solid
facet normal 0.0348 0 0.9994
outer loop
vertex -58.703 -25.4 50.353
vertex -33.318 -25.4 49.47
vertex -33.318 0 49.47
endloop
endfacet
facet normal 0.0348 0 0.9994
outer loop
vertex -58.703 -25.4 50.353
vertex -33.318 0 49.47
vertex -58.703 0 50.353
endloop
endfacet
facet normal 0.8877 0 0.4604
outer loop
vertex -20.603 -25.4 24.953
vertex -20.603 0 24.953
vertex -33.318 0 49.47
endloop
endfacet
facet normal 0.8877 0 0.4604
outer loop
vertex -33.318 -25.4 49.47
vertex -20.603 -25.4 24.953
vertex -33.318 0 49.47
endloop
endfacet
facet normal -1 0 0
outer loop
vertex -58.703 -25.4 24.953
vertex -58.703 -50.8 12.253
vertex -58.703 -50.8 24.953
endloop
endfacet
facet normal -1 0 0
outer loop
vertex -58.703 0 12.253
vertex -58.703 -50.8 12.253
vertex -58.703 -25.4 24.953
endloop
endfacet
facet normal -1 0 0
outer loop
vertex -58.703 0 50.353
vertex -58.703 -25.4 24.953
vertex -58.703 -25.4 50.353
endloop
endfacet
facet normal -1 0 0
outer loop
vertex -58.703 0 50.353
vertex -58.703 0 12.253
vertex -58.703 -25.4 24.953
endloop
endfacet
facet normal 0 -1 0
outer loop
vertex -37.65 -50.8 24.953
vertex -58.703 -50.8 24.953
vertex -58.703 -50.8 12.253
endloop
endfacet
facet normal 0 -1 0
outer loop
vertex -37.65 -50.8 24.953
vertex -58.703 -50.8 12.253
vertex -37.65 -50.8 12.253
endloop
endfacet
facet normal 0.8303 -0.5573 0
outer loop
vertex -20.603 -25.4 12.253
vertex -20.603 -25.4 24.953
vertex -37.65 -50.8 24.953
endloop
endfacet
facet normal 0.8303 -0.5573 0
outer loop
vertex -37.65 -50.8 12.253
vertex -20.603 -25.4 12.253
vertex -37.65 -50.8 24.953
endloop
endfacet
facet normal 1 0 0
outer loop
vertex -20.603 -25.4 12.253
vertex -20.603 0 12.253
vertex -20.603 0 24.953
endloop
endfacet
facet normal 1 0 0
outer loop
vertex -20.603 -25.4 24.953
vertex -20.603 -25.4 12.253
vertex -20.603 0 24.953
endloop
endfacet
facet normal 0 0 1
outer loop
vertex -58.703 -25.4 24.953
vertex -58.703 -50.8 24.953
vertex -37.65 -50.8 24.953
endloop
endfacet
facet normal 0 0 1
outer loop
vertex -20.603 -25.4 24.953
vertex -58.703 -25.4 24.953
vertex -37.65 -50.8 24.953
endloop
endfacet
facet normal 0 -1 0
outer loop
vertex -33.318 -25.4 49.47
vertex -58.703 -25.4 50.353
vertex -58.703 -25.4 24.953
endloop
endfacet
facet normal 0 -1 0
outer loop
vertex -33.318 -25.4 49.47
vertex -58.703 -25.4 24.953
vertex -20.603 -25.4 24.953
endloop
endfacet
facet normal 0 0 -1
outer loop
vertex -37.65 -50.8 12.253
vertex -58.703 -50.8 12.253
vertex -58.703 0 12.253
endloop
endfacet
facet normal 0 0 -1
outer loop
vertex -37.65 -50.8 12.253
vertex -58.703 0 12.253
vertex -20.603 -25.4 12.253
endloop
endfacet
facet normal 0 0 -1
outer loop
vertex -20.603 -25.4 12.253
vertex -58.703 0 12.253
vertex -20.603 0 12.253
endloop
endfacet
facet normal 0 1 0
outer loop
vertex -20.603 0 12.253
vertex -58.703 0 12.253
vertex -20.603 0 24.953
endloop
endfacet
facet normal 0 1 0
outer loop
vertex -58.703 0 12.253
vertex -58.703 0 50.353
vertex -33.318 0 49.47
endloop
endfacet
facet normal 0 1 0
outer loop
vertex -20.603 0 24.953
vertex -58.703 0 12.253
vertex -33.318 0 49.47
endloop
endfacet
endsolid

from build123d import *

# Parameters (mm, degrees)
F1_DEPTH = 25.4
F2_W     = 38.1
F2_H     = 12.7
F3_DEPTH = 25.4
F5_DEPTH = 25.4


with BuildPart() as f1:
    # F0 (on Front) → F1 (new body)
    with BuildSketch(Plane.XZ):
        Polygon((-33.318336, 49.470062), (-58.702985, 50.353006), (-58.702985, 12.253006), (-20.602985, 12.253006), (-20.602985, 24.953006), align=None)
    extrude(amount=F1_DEPTH)

    # F2 (on face) → F3 (join)
    with BuildSketch(Plane.XZ.offset(25.4)):
        with Locations((-39.652985, 18.603006)):
            Rectangle(F2_W, F2_H)
    extrude(amount=F3_DEPTH)

    # F4 (on face) → F5 (cut)
    with BuildSketch(Plane.XY.offset(24.953006)):
        Polygon((-20.602985, -50.8), (-20.602985, -25.4), (-37.649736, -50.8), align=None)
    extrude(amount=-F5_DEPTH, mode=Mode.SUBTRACT)


solid = f1.part
